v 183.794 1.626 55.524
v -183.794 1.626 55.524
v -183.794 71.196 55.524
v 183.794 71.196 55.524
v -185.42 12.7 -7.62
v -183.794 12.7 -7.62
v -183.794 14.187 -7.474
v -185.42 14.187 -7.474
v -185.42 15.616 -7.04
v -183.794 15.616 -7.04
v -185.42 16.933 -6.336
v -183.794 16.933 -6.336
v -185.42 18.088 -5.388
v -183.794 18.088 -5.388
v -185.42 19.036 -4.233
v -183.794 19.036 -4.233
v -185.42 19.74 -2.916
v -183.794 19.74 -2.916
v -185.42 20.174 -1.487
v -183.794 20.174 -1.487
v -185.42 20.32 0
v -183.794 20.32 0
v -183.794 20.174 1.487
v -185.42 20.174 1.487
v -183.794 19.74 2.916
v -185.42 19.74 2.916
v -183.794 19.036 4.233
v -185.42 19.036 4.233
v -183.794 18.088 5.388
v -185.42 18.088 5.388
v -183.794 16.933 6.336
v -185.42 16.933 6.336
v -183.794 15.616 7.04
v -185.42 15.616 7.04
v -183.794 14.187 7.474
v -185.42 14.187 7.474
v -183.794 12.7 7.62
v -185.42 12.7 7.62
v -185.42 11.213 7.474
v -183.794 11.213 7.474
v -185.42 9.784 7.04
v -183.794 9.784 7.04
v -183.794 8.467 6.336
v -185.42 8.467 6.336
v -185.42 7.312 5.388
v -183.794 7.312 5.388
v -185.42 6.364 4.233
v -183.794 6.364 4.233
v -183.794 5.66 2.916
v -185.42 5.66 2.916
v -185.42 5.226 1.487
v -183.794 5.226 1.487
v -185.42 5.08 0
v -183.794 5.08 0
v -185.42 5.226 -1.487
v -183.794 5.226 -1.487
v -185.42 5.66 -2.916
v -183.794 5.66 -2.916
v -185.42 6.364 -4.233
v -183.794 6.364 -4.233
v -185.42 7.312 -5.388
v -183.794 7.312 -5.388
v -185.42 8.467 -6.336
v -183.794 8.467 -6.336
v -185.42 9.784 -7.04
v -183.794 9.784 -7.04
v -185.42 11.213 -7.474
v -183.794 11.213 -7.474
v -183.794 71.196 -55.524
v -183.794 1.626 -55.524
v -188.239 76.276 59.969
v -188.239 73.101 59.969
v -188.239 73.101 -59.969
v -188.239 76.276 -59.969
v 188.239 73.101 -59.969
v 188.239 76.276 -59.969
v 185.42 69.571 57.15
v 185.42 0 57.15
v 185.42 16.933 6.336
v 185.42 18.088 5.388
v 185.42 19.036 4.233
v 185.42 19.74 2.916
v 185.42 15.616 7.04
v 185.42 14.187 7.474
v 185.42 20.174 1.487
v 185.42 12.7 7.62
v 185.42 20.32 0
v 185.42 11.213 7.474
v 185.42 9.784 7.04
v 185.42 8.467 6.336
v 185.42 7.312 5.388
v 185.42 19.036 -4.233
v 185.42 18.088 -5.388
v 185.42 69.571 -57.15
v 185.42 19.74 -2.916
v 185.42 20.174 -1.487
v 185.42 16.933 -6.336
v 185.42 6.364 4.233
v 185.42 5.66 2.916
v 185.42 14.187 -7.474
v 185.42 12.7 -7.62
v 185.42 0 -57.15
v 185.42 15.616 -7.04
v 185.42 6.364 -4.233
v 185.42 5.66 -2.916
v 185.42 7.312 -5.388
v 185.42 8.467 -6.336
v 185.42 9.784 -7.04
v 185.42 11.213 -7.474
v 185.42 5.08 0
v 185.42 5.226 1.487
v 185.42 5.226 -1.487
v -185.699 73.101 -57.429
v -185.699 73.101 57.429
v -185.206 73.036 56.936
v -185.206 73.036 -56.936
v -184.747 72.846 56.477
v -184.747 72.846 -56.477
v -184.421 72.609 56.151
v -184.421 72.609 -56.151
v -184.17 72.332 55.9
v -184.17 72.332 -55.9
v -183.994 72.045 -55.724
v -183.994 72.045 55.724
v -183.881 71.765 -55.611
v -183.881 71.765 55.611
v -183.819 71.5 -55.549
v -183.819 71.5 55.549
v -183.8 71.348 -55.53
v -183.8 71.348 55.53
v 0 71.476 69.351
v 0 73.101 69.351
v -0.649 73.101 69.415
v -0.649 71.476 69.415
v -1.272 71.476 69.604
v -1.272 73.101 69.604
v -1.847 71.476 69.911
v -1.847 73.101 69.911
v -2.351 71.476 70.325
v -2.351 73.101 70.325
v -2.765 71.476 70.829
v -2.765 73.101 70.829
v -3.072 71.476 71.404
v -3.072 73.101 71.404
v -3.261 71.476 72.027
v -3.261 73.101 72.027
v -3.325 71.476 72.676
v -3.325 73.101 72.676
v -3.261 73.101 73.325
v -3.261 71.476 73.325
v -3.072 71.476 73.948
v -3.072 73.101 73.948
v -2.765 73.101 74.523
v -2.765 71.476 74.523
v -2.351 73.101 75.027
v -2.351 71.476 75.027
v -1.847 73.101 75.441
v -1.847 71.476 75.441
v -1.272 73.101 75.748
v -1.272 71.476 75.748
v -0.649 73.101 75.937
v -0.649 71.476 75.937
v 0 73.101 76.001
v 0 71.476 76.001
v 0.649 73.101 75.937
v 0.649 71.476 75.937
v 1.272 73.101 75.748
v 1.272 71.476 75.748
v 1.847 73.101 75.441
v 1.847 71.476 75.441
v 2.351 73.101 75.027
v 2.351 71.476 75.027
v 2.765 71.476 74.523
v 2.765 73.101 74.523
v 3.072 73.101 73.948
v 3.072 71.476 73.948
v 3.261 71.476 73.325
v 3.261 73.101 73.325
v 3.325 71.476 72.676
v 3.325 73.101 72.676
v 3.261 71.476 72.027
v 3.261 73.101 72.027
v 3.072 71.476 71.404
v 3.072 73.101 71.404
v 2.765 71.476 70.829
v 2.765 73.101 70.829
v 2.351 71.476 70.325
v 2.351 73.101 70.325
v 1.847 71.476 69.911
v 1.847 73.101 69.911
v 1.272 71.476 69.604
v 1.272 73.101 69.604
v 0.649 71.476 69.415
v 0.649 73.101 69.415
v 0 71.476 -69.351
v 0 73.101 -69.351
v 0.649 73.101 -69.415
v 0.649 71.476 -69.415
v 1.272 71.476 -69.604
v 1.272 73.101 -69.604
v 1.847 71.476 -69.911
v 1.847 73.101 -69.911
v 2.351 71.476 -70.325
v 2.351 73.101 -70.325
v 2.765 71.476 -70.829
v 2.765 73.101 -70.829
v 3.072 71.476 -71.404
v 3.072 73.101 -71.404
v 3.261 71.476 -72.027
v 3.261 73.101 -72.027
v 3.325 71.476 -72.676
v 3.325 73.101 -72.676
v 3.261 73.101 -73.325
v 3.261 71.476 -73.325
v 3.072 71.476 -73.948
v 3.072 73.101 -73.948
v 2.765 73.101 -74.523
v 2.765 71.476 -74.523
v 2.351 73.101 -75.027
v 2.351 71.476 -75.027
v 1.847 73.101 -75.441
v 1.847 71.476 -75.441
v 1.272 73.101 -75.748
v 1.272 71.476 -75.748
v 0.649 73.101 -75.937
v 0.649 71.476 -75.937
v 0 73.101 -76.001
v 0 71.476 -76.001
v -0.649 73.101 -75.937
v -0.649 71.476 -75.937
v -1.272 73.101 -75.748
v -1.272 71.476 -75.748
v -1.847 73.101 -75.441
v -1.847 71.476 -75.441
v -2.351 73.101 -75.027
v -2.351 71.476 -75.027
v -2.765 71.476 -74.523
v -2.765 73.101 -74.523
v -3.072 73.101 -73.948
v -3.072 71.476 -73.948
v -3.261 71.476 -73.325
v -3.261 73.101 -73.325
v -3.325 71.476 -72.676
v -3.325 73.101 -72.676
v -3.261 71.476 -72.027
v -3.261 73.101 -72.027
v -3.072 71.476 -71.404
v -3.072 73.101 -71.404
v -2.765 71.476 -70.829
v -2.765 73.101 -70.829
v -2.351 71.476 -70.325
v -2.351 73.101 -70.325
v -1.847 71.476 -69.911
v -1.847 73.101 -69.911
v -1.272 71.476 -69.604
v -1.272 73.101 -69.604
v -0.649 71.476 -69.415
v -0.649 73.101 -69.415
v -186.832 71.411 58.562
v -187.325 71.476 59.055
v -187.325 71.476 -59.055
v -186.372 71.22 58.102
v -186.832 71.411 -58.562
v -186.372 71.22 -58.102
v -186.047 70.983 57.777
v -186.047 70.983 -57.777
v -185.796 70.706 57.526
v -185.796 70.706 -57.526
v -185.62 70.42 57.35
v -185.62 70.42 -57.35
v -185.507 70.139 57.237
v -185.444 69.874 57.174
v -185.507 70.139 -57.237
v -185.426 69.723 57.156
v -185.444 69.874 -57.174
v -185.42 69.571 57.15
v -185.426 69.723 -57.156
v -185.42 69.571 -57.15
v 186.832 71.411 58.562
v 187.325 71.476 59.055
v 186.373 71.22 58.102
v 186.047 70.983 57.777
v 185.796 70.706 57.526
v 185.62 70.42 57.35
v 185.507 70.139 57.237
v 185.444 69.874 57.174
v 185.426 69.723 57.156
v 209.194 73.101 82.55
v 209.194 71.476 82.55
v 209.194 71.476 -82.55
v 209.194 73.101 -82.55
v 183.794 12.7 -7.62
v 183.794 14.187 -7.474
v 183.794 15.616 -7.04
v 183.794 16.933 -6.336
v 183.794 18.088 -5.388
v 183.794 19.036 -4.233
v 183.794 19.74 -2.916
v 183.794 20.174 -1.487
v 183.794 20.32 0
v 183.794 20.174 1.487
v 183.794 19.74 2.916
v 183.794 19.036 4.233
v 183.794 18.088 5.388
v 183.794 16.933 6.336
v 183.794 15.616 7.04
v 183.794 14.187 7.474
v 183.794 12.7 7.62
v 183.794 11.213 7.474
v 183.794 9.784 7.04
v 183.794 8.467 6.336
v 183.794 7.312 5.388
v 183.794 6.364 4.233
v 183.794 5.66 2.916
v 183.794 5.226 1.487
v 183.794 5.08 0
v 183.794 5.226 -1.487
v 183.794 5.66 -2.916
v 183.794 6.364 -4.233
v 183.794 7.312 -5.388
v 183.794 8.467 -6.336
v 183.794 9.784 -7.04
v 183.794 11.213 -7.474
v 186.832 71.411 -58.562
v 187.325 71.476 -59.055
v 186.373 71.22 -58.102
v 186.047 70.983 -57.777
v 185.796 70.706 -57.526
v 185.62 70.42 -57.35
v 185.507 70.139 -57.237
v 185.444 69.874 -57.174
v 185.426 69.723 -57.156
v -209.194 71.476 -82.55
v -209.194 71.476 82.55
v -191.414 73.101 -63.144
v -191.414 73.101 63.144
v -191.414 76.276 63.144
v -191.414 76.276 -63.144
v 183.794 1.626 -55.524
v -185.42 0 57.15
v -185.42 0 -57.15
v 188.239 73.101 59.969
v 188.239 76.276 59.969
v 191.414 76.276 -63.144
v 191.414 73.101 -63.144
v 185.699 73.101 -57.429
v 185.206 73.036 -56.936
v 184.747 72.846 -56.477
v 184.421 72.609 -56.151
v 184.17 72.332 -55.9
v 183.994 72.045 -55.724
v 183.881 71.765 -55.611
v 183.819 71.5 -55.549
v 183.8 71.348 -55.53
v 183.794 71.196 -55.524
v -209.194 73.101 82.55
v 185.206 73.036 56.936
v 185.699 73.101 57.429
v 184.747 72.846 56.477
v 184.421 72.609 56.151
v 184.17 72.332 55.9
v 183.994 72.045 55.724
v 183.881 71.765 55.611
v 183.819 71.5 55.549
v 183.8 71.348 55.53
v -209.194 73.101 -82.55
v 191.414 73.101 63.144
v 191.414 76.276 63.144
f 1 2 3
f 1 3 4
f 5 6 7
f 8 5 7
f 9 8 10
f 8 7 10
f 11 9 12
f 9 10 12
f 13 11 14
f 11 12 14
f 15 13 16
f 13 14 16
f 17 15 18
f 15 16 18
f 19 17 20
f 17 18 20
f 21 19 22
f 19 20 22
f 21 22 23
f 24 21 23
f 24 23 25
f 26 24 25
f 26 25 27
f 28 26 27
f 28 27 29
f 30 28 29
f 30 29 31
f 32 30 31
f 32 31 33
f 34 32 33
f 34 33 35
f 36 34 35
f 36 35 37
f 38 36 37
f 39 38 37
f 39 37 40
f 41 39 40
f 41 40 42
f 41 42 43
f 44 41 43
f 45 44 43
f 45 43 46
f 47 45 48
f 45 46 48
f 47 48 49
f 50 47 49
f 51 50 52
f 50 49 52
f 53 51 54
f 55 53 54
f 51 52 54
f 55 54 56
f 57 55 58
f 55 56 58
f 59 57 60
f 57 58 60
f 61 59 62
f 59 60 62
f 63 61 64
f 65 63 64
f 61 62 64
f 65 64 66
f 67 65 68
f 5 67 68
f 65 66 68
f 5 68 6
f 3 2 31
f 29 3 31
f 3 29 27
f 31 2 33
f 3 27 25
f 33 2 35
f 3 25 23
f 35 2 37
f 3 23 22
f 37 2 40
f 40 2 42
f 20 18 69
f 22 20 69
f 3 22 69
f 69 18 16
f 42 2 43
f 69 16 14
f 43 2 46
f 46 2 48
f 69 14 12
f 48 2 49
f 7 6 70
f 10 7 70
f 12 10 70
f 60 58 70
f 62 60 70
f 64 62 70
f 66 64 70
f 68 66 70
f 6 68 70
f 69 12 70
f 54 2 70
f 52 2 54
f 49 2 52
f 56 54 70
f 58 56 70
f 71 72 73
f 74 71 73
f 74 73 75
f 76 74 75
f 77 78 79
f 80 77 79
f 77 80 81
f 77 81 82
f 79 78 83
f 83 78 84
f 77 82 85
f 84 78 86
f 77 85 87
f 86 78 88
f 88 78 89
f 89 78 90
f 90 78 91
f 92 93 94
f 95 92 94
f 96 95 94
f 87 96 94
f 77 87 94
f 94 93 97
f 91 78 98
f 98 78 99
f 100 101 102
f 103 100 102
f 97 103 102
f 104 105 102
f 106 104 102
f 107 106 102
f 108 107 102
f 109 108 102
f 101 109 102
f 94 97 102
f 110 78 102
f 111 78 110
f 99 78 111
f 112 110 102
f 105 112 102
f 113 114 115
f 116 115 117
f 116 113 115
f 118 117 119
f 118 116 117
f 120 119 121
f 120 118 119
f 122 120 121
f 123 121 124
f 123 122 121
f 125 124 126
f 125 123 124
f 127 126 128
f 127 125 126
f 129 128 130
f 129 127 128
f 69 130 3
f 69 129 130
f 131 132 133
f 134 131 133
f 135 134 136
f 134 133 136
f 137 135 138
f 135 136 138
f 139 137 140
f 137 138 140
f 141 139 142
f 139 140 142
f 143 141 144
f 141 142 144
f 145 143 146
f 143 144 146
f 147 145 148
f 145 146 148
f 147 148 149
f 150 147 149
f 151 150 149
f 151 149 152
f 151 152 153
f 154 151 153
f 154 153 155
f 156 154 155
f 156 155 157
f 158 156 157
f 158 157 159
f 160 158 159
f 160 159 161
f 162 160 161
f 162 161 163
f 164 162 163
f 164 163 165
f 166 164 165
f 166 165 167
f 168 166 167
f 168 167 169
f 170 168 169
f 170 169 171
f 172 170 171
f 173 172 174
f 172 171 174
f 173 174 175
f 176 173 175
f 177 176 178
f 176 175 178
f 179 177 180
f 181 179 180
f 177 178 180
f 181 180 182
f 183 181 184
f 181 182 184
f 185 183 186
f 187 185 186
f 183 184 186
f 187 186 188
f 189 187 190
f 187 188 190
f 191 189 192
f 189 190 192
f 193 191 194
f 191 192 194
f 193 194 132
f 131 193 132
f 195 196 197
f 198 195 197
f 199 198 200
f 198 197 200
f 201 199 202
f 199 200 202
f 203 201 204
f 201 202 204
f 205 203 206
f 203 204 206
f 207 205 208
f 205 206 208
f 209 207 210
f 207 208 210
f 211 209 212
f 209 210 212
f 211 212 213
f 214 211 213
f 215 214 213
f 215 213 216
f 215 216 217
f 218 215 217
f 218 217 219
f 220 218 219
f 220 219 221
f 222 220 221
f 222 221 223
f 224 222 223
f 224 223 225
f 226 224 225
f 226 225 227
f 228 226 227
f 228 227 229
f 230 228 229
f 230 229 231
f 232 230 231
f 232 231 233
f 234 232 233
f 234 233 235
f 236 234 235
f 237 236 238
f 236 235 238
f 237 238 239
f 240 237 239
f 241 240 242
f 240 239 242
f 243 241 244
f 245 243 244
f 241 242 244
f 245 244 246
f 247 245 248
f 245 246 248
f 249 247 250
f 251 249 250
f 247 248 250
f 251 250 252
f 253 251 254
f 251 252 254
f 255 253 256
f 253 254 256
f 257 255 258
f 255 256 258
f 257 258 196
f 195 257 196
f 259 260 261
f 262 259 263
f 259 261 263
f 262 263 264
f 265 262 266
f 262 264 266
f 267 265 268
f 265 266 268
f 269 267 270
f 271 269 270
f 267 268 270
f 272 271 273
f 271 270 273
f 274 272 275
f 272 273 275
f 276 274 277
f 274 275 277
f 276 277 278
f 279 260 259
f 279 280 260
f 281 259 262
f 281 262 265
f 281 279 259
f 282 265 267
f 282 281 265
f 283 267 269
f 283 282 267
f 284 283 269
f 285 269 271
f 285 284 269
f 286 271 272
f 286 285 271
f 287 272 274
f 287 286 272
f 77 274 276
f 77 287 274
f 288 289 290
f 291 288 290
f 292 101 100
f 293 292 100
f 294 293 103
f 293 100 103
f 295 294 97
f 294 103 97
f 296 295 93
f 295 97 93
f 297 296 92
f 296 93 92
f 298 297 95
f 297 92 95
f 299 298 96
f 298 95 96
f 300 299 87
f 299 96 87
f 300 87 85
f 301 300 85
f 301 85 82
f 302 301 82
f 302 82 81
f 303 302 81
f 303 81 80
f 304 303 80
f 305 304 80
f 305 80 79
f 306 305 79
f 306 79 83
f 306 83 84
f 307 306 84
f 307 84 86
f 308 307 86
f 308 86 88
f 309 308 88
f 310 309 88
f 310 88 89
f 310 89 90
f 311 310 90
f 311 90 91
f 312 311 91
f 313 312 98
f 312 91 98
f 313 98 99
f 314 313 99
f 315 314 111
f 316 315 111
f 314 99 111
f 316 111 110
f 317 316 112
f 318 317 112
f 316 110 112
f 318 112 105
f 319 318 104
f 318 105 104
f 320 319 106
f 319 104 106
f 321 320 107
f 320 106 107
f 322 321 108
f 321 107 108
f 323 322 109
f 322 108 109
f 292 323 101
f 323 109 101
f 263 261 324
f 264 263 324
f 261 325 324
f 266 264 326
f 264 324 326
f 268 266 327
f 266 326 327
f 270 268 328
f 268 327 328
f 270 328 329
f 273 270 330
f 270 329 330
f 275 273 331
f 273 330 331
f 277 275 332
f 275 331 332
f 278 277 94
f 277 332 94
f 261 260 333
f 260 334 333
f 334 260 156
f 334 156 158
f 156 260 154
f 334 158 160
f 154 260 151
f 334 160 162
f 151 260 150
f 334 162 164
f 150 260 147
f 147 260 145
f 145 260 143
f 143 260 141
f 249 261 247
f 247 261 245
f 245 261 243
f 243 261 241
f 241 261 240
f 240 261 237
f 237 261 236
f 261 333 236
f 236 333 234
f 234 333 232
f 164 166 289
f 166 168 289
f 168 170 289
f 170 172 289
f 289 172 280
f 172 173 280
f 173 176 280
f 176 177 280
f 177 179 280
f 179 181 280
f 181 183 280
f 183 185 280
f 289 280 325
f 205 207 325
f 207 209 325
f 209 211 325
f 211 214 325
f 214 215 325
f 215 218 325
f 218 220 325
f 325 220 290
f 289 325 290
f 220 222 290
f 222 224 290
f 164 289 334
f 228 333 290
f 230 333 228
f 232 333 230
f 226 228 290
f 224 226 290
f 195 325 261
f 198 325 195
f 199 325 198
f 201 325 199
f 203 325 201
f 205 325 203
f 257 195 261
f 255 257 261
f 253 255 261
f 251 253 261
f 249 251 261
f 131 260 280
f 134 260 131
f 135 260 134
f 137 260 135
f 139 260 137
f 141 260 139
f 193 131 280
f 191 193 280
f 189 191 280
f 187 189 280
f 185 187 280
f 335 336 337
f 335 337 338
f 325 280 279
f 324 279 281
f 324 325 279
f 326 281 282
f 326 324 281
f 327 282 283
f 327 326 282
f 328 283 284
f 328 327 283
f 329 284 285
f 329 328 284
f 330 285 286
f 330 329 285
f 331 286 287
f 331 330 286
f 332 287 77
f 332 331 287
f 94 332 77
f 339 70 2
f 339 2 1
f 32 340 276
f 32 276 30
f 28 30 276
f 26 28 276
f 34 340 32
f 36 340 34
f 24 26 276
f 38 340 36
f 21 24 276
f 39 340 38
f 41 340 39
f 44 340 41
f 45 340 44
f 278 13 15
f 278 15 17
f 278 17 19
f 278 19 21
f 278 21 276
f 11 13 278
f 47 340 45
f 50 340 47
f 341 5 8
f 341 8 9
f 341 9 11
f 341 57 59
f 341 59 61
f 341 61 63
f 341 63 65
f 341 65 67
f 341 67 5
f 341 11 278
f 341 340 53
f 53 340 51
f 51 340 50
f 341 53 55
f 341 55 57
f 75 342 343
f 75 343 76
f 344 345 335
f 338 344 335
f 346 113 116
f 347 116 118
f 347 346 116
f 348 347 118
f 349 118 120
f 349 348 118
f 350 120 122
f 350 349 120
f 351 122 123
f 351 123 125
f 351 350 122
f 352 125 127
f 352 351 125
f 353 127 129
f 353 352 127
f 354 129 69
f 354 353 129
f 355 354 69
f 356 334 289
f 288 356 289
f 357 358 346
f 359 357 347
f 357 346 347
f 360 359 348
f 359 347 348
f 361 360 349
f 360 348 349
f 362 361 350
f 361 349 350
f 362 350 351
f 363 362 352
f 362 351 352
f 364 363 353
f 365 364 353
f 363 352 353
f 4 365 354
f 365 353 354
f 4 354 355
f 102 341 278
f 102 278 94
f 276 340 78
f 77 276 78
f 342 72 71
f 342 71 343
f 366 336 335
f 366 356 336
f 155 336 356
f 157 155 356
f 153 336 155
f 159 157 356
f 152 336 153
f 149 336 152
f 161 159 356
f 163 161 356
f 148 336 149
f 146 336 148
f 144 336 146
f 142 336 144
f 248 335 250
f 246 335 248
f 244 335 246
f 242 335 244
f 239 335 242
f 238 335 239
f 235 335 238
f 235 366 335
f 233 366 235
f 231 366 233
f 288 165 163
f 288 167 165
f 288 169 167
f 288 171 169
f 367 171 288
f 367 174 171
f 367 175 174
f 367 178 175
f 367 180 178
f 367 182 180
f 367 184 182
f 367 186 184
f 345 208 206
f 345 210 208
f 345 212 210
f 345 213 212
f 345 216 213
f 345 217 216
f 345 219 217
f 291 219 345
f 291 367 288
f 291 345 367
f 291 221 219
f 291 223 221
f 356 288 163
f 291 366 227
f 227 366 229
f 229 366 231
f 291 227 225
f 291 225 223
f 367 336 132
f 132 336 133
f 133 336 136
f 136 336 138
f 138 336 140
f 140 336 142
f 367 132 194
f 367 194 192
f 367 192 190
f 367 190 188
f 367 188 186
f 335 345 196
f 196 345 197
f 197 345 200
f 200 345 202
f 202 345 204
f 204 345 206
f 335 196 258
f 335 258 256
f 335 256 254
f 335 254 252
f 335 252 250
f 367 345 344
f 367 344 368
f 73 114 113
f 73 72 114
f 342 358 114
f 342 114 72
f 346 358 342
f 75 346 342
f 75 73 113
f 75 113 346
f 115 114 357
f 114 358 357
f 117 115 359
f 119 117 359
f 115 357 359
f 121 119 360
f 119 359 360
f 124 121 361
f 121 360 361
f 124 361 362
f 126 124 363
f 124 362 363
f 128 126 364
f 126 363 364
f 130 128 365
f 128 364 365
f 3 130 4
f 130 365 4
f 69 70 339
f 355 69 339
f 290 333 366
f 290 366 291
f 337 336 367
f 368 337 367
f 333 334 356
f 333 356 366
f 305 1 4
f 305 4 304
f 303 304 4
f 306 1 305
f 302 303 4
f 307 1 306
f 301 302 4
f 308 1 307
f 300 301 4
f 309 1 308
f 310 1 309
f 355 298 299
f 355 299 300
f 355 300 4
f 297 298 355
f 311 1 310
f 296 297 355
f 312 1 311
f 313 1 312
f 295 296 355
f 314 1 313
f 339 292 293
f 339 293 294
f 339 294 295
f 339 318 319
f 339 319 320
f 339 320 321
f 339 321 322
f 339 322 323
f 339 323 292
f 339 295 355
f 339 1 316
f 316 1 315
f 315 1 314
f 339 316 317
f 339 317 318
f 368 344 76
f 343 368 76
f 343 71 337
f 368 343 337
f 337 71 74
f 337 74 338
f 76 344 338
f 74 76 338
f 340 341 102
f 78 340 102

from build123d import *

# Parameters (mm, degrees)
SKETCH1_W           = 370.84
SKETCH1_H           = 114.3
BOSS_EXTRUDE1_DEPTH = 1.6256
SKETCH2_W           = 370.84
SKETCH2_H           = 114.3
SKETCH2_W_2         = 367.5888
SKETCH2_H_2         = 111.0488
BOSS_EXTRUDE2_DEPTH = 69.85
SKETCH3_W           = 418.3888
SKETCH3_H           = 165.1
SKETCH3_W_2         = 367.5888
SKETCH3_H_2         = 111.0488
BOSS_EXTRUDE3_DEPTH = 1.6256
FILLET1_R           = 1.905
SKETCH6_W           = 376.4788
SKETCH6_H           = 119.9388
BOSS_EXTRUDE4_DEPTH = 3.175
CUT_EXTRUDE1_REACH  = 238.475
SKETCH7_R           = 3.324987
SKETCH8_R           = 7.62
CUT_EXTRUDE2_DEPTH  = 411.308525227


with BuildPart() as part:
    # Sketch1 → Boss-Extrude1 (new body)
    with BuildSketch(Plane(origin=(0, 0, 0), x_dir=(1, 0, 0), z_dir=(0, 1, 0))):
        Rectangle(SKETCH1_W, SKETCH1_H)
    extrude(amount=BOSS_EXTRUDE1_DEPTH)

    # Sketch2 → Boss-Extrude2 (add)
    with BuildSketch(Plane(origin=(0, 1.6256, 0), x_dir=(1, 0, 0), z_dir=(0, 1, 0))):
        Rectangle(SKETCH2_W, SKETCH2_H)
        Rectangle(SKETCH2_W_2, SKETCH2_H_2, mode=Mode.SUBTRACT)
    extrude(amount=BOSS_EXTRUDE2_DEPTH)

    # Sketch3 → Boss-Extrude3 (add)
    with BuildSketch(Plane(origin=(0, 71.4756, 0), x_dir=(1, 0, 0), z_dir=(0, 1, 0))):
        Rectangle(SKETCH3_W, SKETCH3_H)
        Rectangle(SKETCH3_W_2, SKETCH3_H_2, mode=Mode.SUBTRACT)
    extrude(amount=BOSS_EXTRUDE3_DEPTH)

    # Fillet1
    fillet1_edges = [part.edges().sort_by_distance(p)[0] for p in [
        (0, 71.4756, -57.15),
        (-185.42, 71.4756, 0),
        (0, 71.4756, 57.15),
        (185.42, 71.4756, 0),
        (-183.7944, 73.1012, 0),
        (0, 73.1012, 55.5244),
        (183.7944, 73.1012, 0),
        (0, 73.1012, -55.5244),
    ]]
    fillet(fillet1_edges, radius=FILLET1_R)

    # Sketch6 → Boss-Extrude4 (add)
    with BuildSketch(Plane(origin=(0, 73.1012, 0), x_dir=(1, 0, 0), z_dir=(0, 1, 0))):
        Polygon((188.2394, -63.1444), (-188.2394, -63.1444), (-191.4144, -63.1444), (-191.4144, 63.1444), (-188.2394, 63.1444), (188.2394, 63.1444), (191.4144, 63.1444), (191.4144, -63.1444), align=None)
        Rectangle(SKETCH6_W, SKETCH6_H, mode=Mode.SUBTRACT)
    extrude(amount=BOSS_EXTRUDE4_DEPTH)

    # Sketch7 → Cut-Extrude1 (cut, up to next)
    with BuildSketch(Plane(origin=(0, 73.1012, 0), x_dir=(1, 0, 0), z_dir=(0, 1, 0)), mode=Mode.PRIVATE) as cut_extrude1_sk1:
        with Locations(Location((0, 72.676058371, 0), (0, 0, 270))):
            Circle(SKETCH7_R)
    cut_extrude1_tool1 = extrude(cut_extrude1_sk1.sketch, amount=-CUT_EXTRUDE1_REACH, mode=Mode.PRIVATE) & part.part
    # Sketch7 → Cut-Extrude1 (cut, up to next)
    with BuildSketch(Plane(origin=(0, 73.1012, 0), x_dir=(1, 0, 0), z_dir=(0, 1, 0)), mode=Mode.PRIVATE) as cut_extrude1_sk2:
        with Locations(Location((0, -72.676058371, 0), (0, 0, 90))):
            Circle(SKETCH7_R)
    cut_extrude1_tool2 = extrude(cut_extrude1_sk2.sketch, amount=-CUT_EXTRUDE1_REACH, mode=Mode.PRIVATE) & part.part
    add(cut_extrude1_tool1.solids().sort_by_distance((0, 73.1012, -72.676058))[0], mode=Mode.SUBTRACT)
    add(cut_extrude1_tool2.solids().sort_by_distance((0, 73.1012, 72.676058))[0], mode=Mode.SUBTRACT)

    # Sketch8 → Cut-Extrude2 (cut, through all)
    with BuildSketch(Plane(origin=(185.42, 0, 0), x_dir=(0, 0, -1), z_dir=(1, 0, 0))):
        with Locations((0, 12.7)):
            Circle(SKETCH8_R)
    extrude(amount=-CUT_EXTRUDE2_DEPTH, mode=Mode.SUBTRACT)


solid = part.part
